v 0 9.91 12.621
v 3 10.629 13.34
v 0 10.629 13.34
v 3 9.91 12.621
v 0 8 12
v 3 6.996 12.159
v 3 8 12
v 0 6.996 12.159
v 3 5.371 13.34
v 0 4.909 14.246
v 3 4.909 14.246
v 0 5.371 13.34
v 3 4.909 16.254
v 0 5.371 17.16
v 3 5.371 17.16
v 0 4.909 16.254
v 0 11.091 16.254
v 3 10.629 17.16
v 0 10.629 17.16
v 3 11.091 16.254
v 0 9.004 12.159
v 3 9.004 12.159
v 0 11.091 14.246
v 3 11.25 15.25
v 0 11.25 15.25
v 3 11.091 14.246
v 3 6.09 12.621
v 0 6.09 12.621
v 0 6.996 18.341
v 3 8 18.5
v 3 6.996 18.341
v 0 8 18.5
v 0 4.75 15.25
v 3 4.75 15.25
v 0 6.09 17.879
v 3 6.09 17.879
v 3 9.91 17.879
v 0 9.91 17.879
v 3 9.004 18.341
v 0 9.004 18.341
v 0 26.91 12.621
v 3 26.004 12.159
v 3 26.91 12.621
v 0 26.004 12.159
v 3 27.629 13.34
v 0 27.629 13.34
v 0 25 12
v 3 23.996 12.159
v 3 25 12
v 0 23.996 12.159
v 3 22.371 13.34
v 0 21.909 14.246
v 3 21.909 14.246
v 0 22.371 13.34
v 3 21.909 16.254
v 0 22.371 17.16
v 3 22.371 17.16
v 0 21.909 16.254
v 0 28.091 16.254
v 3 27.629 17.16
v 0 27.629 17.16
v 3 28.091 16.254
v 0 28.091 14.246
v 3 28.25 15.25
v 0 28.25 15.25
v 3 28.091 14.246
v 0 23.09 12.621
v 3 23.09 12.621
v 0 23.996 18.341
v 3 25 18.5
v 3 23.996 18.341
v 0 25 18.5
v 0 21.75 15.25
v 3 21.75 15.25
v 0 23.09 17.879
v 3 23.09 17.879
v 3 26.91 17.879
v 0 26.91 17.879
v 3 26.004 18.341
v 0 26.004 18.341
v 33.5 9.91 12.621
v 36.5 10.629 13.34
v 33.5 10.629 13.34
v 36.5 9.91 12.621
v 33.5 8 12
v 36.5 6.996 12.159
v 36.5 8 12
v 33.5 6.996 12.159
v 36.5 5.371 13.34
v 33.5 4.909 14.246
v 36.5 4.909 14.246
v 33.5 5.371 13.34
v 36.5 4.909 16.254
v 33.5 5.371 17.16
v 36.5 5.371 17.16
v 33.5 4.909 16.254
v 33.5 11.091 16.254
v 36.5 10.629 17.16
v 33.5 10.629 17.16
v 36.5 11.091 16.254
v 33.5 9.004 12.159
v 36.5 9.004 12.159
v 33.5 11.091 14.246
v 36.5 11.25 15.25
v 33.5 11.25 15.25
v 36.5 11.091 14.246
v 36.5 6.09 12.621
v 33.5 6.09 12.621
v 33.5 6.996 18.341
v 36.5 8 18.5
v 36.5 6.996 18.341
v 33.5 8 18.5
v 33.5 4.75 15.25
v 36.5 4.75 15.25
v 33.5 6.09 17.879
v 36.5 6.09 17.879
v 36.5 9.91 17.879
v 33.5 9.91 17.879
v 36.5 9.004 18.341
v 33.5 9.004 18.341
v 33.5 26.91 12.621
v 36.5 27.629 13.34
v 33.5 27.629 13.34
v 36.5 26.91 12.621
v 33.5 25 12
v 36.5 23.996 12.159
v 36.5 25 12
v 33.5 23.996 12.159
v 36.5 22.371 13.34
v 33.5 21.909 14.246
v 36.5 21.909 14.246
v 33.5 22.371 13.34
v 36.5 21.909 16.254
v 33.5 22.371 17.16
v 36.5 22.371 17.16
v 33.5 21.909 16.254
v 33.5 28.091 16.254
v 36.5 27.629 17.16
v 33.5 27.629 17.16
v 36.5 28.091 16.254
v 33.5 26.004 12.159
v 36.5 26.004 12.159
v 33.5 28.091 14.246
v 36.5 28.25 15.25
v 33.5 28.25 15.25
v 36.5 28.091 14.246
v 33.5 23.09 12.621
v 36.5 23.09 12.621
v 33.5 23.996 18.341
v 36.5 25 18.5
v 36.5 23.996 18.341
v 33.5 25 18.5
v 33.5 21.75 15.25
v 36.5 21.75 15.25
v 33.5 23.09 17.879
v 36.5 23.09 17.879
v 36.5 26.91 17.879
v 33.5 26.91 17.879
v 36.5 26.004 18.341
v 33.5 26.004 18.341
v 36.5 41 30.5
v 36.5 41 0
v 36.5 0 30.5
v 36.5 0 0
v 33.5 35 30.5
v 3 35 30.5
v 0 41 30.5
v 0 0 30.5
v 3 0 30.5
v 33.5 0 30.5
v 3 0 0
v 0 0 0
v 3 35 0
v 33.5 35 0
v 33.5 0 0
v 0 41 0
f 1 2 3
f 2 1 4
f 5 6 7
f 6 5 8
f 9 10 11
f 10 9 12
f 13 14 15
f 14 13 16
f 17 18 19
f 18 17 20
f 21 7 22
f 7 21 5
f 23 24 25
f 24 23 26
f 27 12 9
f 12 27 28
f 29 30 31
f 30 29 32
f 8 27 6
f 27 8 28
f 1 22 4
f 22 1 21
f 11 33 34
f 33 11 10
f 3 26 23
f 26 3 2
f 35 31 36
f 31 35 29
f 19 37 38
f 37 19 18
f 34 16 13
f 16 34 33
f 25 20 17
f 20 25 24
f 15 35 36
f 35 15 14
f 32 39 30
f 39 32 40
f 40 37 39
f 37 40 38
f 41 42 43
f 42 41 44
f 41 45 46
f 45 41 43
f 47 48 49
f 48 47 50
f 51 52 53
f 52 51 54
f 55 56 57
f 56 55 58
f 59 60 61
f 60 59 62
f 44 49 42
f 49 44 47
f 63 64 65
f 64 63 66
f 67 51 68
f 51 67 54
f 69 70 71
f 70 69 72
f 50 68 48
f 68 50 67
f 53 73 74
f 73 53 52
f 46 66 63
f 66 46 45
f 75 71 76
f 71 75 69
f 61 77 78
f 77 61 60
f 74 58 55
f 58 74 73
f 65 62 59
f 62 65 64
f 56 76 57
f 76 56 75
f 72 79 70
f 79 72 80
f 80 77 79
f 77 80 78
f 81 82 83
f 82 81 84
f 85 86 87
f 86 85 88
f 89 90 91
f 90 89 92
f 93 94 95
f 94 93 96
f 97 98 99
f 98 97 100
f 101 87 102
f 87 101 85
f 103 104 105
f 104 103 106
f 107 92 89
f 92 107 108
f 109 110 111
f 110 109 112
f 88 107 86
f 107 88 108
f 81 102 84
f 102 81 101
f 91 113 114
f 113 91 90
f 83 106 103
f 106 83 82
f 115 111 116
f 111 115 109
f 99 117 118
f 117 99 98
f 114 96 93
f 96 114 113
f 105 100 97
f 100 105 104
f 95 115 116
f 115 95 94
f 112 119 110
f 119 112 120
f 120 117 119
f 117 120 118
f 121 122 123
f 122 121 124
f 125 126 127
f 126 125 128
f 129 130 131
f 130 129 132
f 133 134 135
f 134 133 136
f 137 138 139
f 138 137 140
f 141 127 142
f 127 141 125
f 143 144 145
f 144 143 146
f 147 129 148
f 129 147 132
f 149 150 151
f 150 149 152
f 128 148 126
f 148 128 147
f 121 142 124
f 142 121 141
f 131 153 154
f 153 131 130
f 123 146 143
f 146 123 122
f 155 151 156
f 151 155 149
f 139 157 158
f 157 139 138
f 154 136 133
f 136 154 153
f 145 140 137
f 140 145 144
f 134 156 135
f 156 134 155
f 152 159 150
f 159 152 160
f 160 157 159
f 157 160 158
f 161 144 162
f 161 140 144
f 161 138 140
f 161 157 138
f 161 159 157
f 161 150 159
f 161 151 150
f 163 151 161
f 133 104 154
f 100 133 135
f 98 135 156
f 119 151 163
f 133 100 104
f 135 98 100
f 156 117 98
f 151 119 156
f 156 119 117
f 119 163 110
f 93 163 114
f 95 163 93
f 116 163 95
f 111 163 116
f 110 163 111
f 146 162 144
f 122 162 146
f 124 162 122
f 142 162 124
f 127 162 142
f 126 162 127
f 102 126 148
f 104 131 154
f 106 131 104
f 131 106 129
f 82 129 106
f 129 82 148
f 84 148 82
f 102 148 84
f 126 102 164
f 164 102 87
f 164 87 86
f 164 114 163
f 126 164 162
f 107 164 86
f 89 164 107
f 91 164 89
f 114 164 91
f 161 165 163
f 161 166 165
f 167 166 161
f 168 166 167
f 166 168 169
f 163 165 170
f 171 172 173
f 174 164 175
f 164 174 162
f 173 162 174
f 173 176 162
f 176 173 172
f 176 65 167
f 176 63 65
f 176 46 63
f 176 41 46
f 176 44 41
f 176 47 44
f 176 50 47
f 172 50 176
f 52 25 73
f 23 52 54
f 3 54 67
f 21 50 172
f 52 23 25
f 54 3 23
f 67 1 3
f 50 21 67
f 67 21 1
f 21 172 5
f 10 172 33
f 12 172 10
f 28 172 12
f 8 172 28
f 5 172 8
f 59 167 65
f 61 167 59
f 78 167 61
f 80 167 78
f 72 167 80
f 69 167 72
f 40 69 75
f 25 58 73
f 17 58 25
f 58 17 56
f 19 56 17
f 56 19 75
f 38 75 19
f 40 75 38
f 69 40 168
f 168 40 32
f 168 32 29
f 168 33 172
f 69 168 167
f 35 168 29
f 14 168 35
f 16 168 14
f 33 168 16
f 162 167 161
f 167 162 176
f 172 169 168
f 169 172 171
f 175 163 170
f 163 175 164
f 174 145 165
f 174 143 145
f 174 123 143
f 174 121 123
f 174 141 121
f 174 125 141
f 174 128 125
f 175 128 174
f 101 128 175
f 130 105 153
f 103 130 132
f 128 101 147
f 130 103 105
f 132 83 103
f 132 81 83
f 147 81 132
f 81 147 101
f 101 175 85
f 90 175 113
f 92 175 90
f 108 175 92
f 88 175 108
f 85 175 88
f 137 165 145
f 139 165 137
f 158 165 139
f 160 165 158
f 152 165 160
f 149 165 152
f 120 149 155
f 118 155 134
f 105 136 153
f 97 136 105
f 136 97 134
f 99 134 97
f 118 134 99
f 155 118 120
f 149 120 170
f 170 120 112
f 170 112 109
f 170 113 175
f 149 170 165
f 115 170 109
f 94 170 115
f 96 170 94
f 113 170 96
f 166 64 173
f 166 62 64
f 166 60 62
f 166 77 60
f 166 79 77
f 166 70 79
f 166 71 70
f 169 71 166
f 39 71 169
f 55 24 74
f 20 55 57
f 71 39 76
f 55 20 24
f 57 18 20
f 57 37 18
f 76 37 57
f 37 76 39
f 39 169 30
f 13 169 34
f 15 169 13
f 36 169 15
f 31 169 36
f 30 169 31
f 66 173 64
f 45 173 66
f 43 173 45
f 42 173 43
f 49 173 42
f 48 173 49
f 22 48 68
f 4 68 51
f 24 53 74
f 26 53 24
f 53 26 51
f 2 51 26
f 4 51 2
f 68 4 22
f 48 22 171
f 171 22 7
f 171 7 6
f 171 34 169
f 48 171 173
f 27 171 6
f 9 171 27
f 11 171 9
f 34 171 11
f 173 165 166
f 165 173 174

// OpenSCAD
// file: ../../parameters.scad
maximum_printable_size = 150;

layer_thickness = 0.3;
global_clearance = 0.5;


//Screw diameter and nut for M10 [mm]
M10_screw_diameter = 10.4;
M10_head_height = 10;
M10_head_diameter = 16+0.5;
M10_nut_height = 10.5;
M10_nut_diameter = 25.5;
M10_nut_pocket = 22.3;

//Screw diameter for M8 [mm]
M8_screw_diameter = 8.6;
M8_head_height = 8;
M8_head_diameter = 13.5;
M8_nut_height = 7.5;
M8_square_nut_thin_height = 4.5;
M8_nut_diameter = 14.4 + 0.5;
M8_nut_pocket = 13 + 0.5;
M8_washer_diameter = 16;
M8_washer_thickness = 1.5;


//Screw diameter and nut for M6 [mm]
M6_screw_diameter=6.5;
M6_head_diameter = 10+0.5;
M6_head_height = 6;
M6_nut_height = 4.9;
M6_nut_diameter = 11.8;
M6_nut_pocket = 10.4;
M6_square_nut_height = 3;
M6_square_nut_diameter = 10;
M6_washer_thickness = 1.6;

//Screw diameter and nut for M5 [mm]
M5_screw_diameter=5.5;
M5_head_height = 5;
M5_head_diameter = 13+0.5;
M5_nut_height = 4.5;
M5_nut_diameter = 9.4;
M5_nut_pocket = 8.4;

//Screw diameter and nut for M4 [mm]
M4_screw_diameter=4.5;
M4_screw_head_height = 4;
M4_nut_height = 3.2;
M4_nut_diameter = 8.4;
M4_nut_pocket = 7.5;

//Screw diameter and nut for M3 [mm]
M3_screw_diameter = 3.2;
M3_nut_height = 2.7;
M3_nut_diameter = 6.6;
M3_nut_pocket = 5.6;
M3_screw_head_height = 3;

//Screw diameter and nut for M2,5 [mm]
M2_5_screw_diameter = 2.7;
M2_5_nut_height = 2.3;
M2_5_nut_diameter = 6;
M2_5_nut_pocket = 5.5;

// kulove lozisko

bearing_efsm_08_h = 33+1;
bearing_efsm_08_m = 22;
bearing_efsm_08_db = 18;
bearing_efsm_08_ag = 10.5;
bearing_efsm_08_n = M4_screw_diameter;
bearing_efsm_08_a1 = 5.5;
bearing_efsm_08_d = 8.25;
bearing_efsm_08_B = 8; // ball height

bearing_efsm_10_h = 38+1;
bearing_efsm_10_m = 26;
bearing_efsm_10_db = 21.9;
bearing_efsm_10_ag = 12+0.2;
bearing_efsm_10_n = M5_screw_diameter;
bearing_efsm_10_a1 = 6.5;
bearing_efsm_10_d = 10.25;


bearing_efsm_12_width = 40+1;
bearing_efsm_12_h = bearing_efsm_12_width;
bearing_efsm_12_boltd = 28/2; // polovina vzdalenosti mezi srouby
bearing_efsm_12_m = bearing_efsm_12_boltd*2;
bearing_efsm_12_db = 25;
bearing_efsm_12_ag = 13;
bearing_efsm_12_a1 = 7;
bearing_efsm_12_n = M5_screw_diameter;
bearing_efsm_12_d = 12.15;
bearing_efsm_12_B = 10; // ball height
bearing_efsm_space = 1;

bearing_efsm_17_width = 54+1;
bearing_efsm_17_h = bearing_efsm_17_width;
bearing_efsm_17_boltd = 38/2; // polovina vzdalenosti mezi srouby
bearing_efsm_17_m = bearing_efsm_17_boltd*2;
bearing_efsm_17_db = 35;
bearing_efsm_17_ag = 18;
bearing_efsm_17_n = M6_screw_diameter;
bearing_efsm_17_a1 = 10;
bearing_efsm_17_B = 17; // ball height

//limcove lozisko
bearing_EFOM_10_L=26; //celkova sirka zakladny
bearing_EFOM_10_d1=10.3;//diametr otvoru real=10 mm
bearing_EFOM_10_dB=22;//diametr vystupku pro ulozeni lozika
bearing_EFOM_10_H=52;//celková delka zakladny
bearing_EFOM_10_J=36;// hole pitch
bearing_EFOM_10_A1=6.5;//vyska pouzdra
bearing_EFOM_10_Ag=12;//celkova vyska
bearing_EFOM_10_N1=5;//sirka otvoru pro sroub
bearing_EFOM_10_N2=8;//delka otvoru pro sroub
bearing_EFOM_10_m=36;//roztec der pro sroub
bearing_EFOM_10_h=9;//vyska lozika


608_bearing_outer_diameter = 22.3;
608_bearing_inner_diameter = 16;
608_bearing_thickness = 7.1;


// 20 KG servo parameters

servo_20kg_axis_offset = 9.375; // jak je osa mimo stredu
servo_20kg_body_x = 42;
servo_20kg_body_y = 21;
servo_20kg_body_z = 40;
servo_20kg_thread_x = 49/2;
servo_20kg_thread_y = 10/2;
servo_20kg_body_below = 10; // jak hluboko je tělo serva pod drzaky na srouby
servo_20kg_below = 25.8; // jak hluboko je páka serva pod drzaky na srouby

servo_20kg_bolt_d = 2.5+0.3;
servo_20kg_nut_d = 5+0.3;


//strain gauge
strain_gauge_width = 12.7;
strain_gauge_length = 75.1;
strain_gauge_screw_distance = 10;

//ALU profile
ALU_profile_width = 30.5;
ALU_profile_holder_wall_thickness = 3;
ALU_profile_groove_width = 8;

//pillow block bearing
//https://www.igus.eu/product/372
//Part no. KSTM-08
KSTM08_screws_distance = 33;         //m
KSTM08_screws_holes_diameter = 4.5;  //d2
KSTM08_flange_thickness = 6;         //h3
KSTM08_case_width = 9;               //C1
KSTM08_case_length = 47;             //a
KSTM08_ball_width = 12;              //B
KSTM08_ball_hole_diameter = 7.85;    //d1


//ložiska pro malý rotor
bearing_outer_diameter = 10.2;    // Rozměr B1 v nákresu s přídavkem na toleranci otvoru
bearing_thickness = 4;        // Rozměr B2 v nákresu
//bearing_shaft_length = 19.5;    // Rozměr B3 v nákresu, Originalni hodnota 19.5
bearing_shaft_length = 20;    // Rozměr B3 v nákresu


//parametry víčka s telemetrickou anténou
S01_sila_materialu=1.2;
S01_vyska_horni_zavit=10;
S01_hloubka_zavitu=4;
S01_prumer_vnitrni=50;
LO_spodni_prumer=17.2;
LO_vyska_bez_krytu=15;
S01_tolerance_zavit=1.5;
R01_vyska_prekryti_statoru=10;

g3_0_cone1 = 70;
g3_0_srcew_dist = 55;



// scale parameters
base_length = 500;
mid_base_width = 500;
mid_base_height = 200;
mid_base_length = 500;
mid_base_x_offset = 50;
base_mid_base_hinge_offset = 50;
tower_height = 185;
tower_angle = atan((mid_base_width/2-ALU_profile_width-10)/tower_height);
tower_arm_length = tower_height/cos(tower_angle);
tower_drag_z_offset = 22;
electro_box_length = 225;
electro_box_width = 165;
electro_box_height = 51.5;

// calibration device parameters
calibration_arm_x_offset = 140;
calibration_arm_y_offset = 50;

// rotor paramters
rotor_blades_count = 2;
rotor_delta_angle = 12;
blade_mount_screw = M3_screw_diameter;
blade_mount_nut = M3_nut_diameter;
// main file
include <../../parameters.scad>



module ALU_profile_holder_top(deep=35) {
    wall_thickness = ALU_profile_holder_wall_thickness;
    
    module screw_holes() {
        translate([wall_thickness/2, 8, ALU_profile_width/2]) {
            rotate([0, 90, 0]) 
                cylinder(d=M6_screw_diameter, h=wall_thickness*2, center=true, $fn=20);
        }
        translate([wall_thickness/2, deep-10, ALU_profile_width/2]) {
                rotate([0, 90, 0])
                cylinder(d=M6_screw_diameter, h=wall_thickness*2, center=true, $fn=20);
            
        }
    }
    
    difference() {
        cube([ALU_profile_width+wall_thickness*2, deep+wall_thickness*2, ALU_profile_width]);
        translate([wall_thickness, -0.1, -0.1])
            cube([ALU_profile_width, deep+0.1, ALU_profile_width+0.2]);
        
        screw_holes();
        translate([ALU_profile_width+wall_thickness, 0, 0])
            screw_holes();
    }
}

ALU_profile_holder_top(35);
